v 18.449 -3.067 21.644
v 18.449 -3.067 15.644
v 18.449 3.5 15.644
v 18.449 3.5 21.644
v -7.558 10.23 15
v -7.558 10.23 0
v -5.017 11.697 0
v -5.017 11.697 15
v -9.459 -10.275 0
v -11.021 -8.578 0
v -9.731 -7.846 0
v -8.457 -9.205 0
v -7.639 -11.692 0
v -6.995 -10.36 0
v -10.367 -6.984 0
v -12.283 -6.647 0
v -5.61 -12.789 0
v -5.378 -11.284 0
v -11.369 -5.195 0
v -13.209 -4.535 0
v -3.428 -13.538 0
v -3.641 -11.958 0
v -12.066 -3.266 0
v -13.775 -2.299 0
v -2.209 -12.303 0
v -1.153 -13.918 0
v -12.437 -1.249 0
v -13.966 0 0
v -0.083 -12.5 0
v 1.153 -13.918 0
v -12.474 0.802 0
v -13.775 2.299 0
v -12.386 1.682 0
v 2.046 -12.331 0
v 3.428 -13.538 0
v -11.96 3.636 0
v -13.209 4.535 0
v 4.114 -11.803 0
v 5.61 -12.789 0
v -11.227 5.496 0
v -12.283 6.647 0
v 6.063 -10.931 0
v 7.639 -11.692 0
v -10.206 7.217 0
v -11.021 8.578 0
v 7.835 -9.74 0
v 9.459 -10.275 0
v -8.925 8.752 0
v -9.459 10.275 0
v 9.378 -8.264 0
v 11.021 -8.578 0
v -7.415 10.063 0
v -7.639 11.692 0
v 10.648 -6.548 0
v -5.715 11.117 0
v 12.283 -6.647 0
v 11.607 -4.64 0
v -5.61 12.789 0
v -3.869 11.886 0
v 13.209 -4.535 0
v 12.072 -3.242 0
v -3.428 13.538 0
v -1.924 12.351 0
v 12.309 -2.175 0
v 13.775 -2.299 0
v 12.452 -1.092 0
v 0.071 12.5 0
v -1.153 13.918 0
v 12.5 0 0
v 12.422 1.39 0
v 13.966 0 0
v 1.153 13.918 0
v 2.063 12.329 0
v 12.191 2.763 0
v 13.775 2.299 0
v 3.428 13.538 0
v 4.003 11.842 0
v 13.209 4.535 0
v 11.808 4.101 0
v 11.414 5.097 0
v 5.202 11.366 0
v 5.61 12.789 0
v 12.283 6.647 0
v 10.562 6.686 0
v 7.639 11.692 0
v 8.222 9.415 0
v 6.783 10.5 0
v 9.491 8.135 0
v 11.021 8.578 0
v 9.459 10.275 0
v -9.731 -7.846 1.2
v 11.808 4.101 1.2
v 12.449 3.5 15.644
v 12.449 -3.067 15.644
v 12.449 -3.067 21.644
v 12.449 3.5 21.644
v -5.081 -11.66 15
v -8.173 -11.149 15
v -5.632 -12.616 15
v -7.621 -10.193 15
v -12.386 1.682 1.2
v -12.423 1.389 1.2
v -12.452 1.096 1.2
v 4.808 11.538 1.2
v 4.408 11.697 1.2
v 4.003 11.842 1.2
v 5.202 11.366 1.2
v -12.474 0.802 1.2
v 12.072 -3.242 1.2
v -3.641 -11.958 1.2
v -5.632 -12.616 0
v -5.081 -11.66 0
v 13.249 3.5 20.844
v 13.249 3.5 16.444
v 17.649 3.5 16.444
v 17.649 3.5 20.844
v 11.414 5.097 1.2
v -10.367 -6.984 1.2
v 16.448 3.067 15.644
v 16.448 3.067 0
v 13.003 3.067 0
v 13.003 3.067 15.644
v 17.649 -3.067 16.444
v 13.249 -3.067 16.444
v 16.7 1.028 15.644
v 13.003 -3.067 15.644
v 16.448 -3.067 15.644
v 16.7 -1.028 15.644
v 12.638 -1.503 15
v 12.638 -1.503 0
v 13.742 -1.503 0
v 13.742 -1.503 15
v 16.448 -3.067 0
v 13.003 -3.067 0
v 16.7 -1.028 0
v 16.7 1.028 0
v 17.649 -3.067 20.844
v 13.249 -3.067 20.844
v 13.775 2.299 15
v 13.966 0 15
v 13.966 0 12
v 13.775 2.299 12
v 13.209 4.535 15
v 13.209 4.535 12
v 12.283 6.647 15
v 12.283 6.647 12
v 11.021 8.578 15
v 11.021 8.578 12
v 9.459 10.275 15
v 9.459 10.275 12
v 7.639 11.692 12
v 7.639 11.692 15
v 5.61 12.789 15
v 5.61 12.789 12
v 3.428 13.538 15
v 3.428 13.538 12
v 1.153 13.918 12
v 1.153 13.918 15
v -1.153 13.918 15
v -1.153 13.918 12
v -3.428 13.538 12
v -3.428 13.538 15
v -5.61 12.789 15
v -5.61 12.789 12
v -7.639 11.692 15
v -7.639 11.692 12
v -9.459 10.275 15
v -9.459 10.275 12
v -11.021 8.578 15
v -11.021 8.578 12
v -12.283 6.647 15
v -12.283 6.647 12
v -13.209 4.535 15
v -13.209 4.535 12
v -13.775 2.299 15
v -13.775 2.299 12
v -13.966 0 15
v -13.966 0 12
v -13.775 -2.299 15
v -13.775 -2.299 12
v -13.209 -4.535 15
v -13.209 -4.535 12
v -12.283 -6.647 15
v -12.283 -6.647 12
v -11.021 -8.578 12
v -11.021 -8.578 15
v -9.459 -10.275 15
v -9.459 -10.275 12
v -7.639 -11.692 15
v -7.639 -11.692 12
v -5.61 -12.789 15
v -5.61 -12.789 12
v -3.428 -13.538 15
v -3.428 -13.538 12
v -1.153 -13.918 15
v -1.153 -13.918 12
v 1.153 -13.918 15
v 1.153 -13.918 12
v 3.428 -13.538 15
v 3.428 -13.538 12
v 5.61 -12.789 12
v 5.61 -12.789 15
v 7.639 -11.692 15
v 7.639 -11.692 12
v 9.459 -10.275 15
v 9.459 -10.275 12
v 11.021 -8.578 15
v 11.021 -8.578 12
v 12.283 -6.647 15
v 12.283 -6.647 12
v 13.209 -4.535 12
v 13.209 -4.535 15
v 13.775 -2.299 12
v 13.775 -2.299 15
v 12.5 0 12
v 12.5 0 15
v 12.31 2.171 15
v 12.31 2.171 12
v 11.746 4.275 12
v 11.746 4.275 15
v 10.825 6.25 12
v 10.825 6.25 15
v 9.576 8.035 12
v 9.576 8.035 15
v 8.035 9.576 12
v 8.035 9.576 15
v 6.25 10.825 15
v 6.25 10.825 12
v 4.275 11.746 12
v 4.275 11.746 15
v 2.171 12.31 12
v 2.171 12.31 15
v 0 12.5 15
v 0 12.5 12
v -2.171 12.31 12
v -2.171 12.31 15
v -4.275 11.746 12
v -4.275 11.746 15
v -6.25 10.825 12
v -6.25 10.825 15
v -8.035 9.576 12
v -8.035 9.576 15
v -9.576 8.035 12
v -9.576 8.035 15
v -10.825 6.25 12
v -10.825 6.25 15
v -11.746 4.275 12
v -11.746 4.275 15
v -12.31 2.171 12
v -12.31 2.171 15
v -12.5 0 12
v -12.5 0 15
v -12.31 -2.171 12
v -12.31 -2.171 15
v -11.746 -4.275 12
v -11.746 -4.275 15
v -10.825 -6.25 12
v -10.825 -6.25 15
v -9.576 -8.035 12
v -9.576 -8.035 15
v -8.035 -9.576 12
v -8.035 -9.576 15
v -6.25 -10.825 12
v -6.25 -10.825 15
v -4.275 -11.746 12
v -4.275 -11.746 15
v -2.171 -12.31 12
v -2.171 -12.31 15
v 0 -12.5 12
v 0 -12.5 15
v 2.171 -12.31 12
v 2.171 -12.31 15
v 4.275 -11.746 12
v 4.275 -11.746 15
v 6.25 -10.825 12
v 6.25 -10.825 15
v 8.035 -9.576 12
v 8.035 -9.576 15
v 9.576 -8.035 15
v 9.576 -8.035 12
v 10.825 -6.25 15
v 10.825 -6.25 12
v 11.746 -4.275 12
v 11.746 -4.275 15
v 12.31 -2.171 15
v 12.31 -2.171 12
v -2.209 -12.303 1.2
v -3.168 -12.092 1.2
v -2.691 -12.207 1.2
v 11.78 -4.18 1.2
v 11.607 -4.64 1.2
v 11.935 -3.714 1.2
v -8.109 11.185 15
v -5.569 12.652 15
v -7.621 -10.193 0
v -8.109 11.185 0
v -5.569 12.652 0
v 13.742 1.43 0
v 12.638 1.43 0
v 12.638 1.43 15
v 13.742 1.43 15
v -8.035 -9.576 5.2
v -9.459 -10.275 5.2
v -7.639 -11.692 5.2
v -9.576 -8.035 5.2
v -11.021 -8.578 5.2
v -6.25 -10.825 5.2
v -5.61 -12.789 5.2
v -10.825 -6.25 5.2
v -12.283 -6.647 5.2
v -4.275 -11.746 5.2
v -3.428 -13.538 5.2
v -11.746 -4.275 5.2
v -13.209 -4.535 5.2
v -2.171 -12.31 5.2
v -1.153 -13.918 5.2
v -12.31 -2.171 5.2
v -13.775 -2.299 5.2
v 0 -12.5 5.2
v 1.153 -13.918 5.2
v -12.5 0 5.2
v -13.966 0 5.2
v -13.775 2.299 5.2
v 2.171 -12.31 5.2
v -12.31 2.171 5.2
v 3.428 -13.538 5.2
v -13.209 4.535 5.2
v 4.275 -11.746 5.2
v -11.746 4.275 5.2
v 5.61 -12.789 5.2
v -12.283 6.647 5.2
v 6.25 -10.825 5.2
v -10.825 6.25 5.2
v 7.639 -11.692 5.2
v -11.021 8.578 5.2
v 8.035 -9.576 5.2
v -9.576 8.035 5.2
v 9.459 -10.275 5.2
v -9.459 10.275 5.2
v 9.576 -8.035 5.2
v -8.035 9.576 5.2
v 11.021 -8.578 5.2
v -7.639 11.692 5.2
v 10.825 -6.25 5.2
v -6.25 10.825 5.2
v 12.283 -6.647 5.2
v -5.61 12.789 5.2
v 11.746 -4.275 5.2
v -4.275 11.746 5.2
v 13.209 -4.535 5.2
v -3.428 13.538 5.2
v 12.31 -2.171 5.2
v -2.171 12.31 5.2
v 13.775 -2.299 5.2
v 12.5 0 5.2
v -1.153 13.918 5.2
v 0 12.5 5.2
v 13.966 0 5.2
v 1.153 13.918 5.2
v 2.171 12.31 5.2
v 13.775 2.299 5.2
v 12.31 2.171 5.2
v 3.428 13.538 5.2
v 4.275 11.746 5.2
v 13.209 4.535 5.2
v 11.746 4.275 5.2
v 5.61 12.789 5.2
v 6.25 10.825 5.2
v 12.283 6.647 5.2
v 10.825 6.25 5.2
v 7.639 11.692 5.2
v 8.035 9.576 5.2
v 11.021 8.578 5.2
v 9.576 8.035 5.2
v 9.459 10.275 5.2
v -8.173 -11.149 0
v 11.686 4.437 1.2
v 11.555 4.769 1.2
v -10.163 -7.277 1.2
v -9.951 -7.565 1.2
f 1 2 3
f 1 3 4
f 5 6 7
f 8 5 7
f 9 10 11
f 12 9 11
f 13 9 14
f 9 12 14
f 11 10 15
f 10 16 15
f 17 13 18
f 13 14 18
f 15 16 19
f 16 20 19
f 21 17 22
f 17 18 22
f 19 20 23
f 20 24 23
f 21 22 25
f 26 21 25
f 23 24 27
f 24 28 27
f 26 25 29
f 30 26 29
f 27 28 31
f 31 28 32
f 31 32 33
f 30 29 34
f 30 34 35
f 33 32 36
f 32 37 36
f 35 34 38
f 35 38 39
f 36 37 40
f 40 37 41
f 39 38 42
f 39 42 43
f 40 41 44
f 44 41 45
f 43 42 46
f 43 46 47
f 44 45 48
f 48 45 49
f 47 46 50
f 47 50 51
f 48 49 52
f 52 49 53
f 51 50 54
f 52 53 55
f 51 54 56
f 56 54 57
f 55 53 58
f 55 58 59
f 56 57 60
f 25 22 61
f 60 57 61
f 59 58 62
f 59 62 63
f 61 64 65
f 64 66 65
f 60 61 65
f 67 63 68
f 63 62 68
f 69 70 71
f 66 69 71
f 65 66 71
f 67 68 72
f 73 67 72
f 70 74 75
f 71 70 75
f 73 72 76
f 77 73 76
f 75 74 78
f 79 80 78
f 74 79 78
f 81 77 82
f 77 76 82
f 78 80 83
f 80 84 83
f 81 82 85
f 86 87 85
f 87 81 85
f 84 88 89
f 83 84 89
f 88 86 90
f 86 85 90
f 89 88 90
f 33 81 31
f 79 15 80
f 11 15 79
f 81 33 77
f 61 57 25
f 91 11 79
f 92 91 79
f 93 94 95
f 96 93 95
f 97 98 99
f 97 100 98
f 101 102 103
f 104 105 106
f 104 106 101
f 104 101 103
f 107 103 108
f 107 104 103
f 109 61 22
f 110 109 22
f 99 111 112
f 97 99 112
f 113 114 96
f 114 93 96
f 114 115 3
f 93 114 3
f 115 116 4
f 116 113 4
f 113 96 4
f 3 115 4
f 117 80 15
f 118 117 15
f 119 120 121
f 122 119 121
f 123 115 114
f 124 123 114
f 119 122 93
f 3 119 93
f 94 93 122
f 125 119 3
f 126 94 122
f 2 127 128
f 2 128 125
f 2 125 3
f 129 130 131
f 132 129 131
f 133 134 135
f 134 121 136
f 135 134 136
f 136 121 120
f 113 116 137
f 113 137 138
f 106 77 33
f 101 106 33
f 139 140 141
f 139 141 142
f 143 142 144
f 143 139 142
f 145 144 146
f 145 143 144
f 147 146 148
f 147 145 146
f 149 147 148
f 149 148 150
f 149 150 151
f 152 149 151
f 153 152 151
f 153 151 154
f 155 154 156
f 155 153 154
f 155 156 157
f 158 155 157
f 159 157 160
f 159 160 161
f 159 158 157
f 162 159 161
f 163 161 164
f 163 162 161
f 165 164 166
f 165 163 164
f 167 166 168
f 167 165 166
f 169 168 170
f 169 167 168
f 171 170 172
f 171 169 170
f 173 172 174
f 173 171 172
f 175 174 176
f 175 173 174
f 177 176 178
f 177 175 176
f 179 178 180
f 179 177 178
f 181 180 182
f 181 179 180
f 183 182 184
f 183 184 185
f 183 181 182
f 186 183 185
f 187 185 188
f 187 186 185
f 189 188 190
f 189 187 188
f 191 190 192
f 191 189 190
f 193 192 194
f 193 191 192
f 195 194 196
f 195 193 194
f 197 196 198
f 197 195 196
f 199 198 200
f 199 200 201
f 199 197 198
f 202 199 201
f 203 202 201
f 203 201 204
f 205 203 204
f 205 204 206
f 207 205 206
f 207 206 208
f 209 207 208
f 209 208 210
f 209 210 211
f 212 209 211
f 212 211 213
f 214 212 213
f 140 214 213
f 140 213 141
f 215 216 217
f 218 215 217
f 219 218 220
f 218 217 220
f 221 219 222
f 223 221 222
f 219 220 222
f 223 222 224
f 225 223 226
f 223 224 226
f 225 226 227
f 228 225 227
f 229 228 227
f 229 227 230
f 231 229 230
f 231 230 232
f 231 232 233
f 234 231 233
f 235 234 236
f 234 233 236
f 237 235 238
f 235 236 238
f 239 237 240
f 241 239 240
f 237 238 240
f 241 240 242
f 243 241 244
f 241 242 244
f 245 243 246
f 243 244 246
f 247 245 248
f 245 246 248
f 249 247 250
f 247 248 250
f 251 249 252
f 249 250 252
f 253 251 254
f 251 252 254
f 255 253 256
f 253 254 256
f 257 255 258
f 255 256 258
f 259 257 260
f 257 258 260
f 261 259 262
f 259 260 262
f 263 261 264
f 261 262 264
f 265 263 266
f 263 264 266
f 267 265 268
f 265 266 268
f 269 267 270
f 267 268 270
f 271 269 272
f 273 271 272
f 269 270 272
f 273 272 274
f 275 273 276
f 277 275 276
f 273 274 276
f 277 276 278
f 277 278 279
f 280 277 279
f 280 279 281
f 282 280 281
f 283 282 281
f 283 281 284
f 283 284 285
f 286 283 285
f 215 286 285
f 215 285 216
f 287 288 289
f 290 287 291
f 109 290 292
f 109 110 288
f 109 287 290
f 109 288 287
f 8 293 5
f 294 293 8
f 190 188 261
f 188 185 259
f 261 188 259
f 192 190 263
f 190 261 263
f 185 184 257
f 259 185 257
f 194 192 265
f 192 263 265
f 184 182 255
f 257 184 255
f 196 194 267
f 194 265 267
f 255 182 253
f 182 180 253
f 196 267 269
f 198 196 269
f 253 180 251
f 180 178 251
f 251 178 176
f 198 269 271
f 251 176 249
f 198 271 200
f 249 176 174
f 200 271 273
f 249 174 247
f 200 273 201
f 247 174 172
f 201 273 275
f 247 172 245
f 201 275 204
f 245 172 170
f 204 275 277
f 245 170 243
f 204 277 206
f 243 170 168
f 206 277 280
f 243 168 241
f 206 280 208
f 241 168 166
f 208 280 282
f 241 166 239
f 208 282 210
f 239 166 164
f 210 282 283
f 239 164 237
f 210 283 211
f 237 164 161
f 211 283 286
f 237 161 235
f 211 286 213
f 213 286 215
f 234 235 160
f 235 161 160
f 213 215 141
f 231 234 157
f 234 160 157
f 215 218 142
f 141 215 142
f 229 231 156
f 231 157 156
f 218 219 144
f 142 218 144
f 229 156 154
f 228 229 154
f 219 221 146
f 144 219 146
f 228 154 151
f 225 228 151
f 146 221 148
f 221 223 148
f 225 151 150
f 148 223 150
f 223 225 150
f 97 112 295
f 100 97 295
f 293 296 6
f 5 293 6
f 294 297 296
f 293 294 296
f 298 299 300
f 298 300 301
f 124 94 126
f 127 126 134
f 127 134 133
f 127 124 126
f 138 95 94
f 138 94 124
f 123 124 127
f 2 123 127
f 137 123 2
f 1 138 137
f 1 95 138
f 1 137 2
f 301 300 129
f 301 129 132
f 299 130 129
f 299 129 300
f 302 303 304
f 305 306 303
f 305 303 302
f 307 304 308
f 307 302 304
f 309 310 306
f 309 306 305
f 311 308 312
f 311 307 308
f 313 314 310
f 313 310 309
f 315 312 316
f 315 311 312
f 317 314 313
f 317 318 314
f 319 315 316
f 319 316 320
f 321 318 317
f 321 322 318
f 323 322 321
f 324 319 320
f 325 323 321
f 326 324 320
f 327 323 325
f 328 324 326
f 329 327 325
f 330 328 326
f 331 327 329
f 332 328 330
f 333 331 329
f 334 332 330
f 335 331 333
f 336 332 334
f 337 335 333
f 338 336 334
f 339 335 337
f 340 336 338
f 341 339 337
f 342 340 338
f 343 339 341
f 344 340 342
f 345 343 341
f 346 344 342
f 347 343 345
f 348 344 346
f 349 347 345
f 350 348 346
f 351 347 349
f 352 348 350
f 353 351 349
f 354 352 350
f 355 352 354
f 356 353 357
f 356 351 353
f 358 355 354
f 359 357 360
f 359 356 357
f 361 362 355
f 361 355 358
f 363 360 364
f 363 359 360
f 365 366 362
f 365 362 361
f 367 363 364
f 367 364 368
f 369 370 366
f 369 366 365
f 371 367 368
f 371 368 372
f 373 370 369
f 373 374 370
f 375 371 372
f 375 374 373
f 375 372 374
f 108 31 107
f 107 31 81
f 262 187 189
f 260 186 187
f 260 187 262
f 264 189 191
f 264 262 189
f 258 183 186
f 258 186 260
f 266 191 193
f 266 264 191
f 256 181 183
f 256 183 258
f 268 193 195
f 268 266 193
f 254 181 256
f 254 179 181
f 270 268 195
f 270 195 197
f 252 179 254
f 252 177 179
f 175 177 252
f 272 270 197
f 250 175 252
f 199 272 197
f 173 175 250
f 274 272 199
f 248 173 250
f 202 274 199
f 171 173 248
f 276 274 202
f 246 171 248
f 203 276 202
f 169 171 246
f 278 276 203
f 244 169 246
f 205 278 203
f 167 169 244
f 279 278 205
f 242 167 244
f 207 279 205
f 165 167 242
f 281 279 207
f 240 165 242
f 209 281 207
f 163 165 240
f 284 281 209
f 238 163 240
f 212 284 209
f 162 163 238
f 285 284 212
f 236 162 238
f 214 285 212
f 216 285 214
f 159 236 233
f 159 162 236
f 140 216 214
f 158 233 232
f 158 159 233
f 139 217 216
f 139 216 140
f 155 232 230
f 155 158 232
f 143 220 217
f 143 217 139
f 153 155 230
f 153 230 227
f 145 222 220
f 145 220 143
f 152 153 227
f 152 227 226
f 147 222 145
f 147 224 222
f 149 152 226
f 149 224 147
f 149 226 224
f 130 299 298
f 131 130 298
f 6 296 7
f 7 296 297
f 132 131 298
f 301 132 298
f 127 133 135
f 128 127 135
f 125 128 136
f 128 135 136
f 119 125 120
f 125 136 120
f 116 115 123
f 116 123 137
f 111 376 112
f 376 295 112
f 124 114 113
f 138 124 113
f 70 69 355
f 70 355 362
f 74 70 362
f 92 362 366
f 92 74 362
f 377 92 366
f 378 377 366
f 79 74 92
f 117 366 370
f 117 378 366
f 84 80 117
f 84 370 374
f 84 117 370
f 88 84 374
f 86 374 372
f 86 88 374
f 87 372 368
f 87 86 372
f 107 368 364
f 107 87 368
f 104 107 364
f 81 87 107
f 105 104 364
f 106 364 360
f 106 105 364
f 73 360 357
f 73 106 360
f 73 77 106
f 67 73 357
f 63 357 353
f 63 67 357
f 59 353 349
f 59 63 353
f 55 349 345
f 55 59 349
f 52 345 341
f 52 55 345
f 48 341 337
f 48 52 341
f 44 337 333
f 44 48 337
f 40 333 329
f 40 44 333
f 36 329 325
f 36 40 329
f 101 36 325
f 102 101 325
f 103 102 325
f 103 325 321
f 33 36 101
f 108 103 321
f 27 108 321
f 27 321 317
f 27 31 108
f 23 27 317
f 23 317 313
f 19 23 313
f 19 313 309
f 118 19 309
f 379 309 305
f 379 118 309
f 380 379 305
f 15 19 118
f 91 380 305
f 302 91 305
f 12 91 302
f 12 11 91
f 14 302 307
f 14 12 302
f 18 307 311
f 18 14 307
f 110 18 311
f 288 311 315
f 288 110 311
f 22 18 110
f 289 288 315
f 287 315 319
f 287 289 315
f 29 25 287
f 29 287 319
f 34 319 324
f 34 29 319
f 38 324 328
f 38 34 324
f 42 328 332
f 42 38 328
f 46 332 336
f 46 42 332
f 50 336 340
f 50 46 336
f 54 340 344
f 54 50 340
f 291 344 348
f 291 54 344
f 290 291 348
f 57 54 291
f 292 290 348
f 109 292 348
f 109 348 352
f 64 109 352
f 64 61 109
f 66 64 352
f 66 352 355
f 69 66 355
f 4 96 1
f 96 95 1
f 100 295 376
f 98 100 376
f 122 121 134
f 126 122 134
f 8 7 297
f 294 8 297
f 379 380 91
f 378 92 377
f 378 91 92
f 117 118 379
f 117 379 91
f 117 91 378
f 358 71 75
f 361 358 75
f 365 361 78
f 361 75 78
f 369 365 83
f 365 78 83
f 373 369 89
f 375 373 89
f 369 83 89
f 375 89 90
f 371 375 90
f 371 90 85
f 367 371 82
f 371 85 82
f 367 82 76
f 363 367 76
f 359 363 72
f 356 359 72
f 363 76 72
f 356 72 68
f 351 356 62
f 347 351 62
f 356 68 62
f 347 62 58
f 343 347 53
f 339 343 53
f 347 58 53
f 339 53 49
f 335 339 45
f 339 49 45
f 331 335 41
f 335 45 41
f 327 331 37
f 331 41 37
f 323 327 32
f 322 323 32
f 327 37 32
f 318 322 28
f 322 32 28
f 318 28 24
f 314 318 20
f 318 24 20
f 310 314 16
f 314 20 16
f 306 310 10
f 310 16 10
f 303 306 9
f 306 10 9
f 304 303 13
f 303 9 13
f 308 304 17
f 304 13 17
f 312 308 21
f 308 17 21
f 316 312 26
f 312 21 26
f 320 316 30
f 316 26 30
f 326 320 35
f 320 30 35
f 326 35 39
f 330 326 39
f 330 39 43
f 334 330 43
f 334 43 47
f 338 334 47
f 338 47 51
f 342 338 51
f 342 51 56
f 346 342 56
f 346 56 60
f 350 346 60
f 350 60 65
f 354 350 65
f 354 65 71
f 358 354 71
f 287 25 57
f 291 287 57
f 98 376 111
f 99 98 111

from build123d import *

# Parameters (mm, degrees)
F0_R      = 13.965768
F0_R_2    = 12.5
F1_DEPTH  = 5.2
F3_DEPTH  = 1.2
F5_R      = 13.965768
F5_R_2    = 12.5
F6_DEPTH  = 3
F7_W      = 1.10313
F7_H      = 2.9336
F8_DEPTH  = 15
F10_DEPTH = 17.6
F11_W     = 6
F11_H     = 6
F12_DEPTH = 3.067493
F13_W     = 6
F13_H     = 6
F14_DEPTH = 3.5
F15_W     = 4.4
F15_H     = 4.4
F16_DEPTH = 25


with BuildPart() as f1:
    # F0 (on Top) → F1 (new body)
    with BuildSketch(Plane.XY):
        Circle(F0_R)
        Circle(F0_R_2, mode=Mode.SUBTRACT)
    extrude(amount=F1_DEPTH)

    # F2 (on Top) → F3 (join)
    with BuildSketch(Plane.XY):
        Polygon((5.791257, 11.718208), (4.625045, 12.227155), (-13.397259, 1.054958), (-13.397259, 0.250499), align=None)
        Polygon((11.866841, 5.348552), (-11.179983, -7.435048), (-10.662637, -8.362845), (12.382109, 4.419604), align=None)
        Polygon((13.070082, -2.68876), (-4.980911, -12.701276), (-3.92895, -13.257451), (12.413866, -4.192426), align=None)
    extrude(amount=F3_DEPTH)


with BuildPart() as f6:
    # F5 (on offset) → F6 (new body)
    with BuildSketch(Plane.XY.offset(15)):
        Circle(F5_R)
        Circle(F5_R_2, mode=Mode.SUBTRACT)
    extrude(amount=-F6_DEPTH)


with BuildPart() as f8:
    # F7 (on Top) → F8 (new body, through all)
    with BuildSketch(Plane.XY):
        with Locations((13.189981, -0.036631)):
            Rectangle(F7_W, F7_H)
        Polygon((-5.568764, 12.652244), (-8.109336, 11.185444), (-7.557771, 10.230105), (-5.017199, 11.696905), align=None)
        Polygon((-8.172783, -11.148813), (-5.63221, -12.615613), (-5.080645, -11.660274), (-7.621218, -10.193474), align=None)
    extrude(amount=F8_DEPTH)


with BuildPart() as f10:
    # F9 (on Top) → F10 (new body)
    with BuildSketch(Plane.XY):
        with BuildLine():
            Line((13.002994, -3.067493), (16.448344, -3.067493))
            ThreePointArc((16.448344, -3.067493), (16.731931, 0), (16.448344, 3.067493))
            Line((16.448344, 3.067493), (13.002994, 3.067493))
            Line((13.002994, 3.067493), (13.002994, 0))
            Line((13.002994, 0), (13.002994, -3.067493))
        make_face()
    extrude(amount=F10_DEPTH)

    # F11 (on Front) → F12 (join, through all)
    with BuildSketch(Plane.XZ):
        with Locations((15.44897, 18.643515)):
            Rectangle(F11_W, F11_H)
    extrude(amount=F12_DEPTH)

    # F13 (on Front) → F14 (join)
    with BuildSketch(Plane.XZ):
        with Locations((15.44897, 18.643515)):
            Rectangle(F13_W, F13_H)
    extrude(amount=-F14_DEPTH)

    # F15 (on face) → F16 (cut)
    with BuildSketch(Plane(origin=(0, 3.5, 0), x_dir=(-1, 0, 0), z_dir=(0, 1, 0))):
        with Locations((-15.44897, 18.643515)):
            Rectangle(F15_W, F15_H)
    extrude(amount=-F16_DEPTH, mode=Mode.SUBTRACT)


solid = Compound([f1.part, f6.part, f8.part, f10.part])
